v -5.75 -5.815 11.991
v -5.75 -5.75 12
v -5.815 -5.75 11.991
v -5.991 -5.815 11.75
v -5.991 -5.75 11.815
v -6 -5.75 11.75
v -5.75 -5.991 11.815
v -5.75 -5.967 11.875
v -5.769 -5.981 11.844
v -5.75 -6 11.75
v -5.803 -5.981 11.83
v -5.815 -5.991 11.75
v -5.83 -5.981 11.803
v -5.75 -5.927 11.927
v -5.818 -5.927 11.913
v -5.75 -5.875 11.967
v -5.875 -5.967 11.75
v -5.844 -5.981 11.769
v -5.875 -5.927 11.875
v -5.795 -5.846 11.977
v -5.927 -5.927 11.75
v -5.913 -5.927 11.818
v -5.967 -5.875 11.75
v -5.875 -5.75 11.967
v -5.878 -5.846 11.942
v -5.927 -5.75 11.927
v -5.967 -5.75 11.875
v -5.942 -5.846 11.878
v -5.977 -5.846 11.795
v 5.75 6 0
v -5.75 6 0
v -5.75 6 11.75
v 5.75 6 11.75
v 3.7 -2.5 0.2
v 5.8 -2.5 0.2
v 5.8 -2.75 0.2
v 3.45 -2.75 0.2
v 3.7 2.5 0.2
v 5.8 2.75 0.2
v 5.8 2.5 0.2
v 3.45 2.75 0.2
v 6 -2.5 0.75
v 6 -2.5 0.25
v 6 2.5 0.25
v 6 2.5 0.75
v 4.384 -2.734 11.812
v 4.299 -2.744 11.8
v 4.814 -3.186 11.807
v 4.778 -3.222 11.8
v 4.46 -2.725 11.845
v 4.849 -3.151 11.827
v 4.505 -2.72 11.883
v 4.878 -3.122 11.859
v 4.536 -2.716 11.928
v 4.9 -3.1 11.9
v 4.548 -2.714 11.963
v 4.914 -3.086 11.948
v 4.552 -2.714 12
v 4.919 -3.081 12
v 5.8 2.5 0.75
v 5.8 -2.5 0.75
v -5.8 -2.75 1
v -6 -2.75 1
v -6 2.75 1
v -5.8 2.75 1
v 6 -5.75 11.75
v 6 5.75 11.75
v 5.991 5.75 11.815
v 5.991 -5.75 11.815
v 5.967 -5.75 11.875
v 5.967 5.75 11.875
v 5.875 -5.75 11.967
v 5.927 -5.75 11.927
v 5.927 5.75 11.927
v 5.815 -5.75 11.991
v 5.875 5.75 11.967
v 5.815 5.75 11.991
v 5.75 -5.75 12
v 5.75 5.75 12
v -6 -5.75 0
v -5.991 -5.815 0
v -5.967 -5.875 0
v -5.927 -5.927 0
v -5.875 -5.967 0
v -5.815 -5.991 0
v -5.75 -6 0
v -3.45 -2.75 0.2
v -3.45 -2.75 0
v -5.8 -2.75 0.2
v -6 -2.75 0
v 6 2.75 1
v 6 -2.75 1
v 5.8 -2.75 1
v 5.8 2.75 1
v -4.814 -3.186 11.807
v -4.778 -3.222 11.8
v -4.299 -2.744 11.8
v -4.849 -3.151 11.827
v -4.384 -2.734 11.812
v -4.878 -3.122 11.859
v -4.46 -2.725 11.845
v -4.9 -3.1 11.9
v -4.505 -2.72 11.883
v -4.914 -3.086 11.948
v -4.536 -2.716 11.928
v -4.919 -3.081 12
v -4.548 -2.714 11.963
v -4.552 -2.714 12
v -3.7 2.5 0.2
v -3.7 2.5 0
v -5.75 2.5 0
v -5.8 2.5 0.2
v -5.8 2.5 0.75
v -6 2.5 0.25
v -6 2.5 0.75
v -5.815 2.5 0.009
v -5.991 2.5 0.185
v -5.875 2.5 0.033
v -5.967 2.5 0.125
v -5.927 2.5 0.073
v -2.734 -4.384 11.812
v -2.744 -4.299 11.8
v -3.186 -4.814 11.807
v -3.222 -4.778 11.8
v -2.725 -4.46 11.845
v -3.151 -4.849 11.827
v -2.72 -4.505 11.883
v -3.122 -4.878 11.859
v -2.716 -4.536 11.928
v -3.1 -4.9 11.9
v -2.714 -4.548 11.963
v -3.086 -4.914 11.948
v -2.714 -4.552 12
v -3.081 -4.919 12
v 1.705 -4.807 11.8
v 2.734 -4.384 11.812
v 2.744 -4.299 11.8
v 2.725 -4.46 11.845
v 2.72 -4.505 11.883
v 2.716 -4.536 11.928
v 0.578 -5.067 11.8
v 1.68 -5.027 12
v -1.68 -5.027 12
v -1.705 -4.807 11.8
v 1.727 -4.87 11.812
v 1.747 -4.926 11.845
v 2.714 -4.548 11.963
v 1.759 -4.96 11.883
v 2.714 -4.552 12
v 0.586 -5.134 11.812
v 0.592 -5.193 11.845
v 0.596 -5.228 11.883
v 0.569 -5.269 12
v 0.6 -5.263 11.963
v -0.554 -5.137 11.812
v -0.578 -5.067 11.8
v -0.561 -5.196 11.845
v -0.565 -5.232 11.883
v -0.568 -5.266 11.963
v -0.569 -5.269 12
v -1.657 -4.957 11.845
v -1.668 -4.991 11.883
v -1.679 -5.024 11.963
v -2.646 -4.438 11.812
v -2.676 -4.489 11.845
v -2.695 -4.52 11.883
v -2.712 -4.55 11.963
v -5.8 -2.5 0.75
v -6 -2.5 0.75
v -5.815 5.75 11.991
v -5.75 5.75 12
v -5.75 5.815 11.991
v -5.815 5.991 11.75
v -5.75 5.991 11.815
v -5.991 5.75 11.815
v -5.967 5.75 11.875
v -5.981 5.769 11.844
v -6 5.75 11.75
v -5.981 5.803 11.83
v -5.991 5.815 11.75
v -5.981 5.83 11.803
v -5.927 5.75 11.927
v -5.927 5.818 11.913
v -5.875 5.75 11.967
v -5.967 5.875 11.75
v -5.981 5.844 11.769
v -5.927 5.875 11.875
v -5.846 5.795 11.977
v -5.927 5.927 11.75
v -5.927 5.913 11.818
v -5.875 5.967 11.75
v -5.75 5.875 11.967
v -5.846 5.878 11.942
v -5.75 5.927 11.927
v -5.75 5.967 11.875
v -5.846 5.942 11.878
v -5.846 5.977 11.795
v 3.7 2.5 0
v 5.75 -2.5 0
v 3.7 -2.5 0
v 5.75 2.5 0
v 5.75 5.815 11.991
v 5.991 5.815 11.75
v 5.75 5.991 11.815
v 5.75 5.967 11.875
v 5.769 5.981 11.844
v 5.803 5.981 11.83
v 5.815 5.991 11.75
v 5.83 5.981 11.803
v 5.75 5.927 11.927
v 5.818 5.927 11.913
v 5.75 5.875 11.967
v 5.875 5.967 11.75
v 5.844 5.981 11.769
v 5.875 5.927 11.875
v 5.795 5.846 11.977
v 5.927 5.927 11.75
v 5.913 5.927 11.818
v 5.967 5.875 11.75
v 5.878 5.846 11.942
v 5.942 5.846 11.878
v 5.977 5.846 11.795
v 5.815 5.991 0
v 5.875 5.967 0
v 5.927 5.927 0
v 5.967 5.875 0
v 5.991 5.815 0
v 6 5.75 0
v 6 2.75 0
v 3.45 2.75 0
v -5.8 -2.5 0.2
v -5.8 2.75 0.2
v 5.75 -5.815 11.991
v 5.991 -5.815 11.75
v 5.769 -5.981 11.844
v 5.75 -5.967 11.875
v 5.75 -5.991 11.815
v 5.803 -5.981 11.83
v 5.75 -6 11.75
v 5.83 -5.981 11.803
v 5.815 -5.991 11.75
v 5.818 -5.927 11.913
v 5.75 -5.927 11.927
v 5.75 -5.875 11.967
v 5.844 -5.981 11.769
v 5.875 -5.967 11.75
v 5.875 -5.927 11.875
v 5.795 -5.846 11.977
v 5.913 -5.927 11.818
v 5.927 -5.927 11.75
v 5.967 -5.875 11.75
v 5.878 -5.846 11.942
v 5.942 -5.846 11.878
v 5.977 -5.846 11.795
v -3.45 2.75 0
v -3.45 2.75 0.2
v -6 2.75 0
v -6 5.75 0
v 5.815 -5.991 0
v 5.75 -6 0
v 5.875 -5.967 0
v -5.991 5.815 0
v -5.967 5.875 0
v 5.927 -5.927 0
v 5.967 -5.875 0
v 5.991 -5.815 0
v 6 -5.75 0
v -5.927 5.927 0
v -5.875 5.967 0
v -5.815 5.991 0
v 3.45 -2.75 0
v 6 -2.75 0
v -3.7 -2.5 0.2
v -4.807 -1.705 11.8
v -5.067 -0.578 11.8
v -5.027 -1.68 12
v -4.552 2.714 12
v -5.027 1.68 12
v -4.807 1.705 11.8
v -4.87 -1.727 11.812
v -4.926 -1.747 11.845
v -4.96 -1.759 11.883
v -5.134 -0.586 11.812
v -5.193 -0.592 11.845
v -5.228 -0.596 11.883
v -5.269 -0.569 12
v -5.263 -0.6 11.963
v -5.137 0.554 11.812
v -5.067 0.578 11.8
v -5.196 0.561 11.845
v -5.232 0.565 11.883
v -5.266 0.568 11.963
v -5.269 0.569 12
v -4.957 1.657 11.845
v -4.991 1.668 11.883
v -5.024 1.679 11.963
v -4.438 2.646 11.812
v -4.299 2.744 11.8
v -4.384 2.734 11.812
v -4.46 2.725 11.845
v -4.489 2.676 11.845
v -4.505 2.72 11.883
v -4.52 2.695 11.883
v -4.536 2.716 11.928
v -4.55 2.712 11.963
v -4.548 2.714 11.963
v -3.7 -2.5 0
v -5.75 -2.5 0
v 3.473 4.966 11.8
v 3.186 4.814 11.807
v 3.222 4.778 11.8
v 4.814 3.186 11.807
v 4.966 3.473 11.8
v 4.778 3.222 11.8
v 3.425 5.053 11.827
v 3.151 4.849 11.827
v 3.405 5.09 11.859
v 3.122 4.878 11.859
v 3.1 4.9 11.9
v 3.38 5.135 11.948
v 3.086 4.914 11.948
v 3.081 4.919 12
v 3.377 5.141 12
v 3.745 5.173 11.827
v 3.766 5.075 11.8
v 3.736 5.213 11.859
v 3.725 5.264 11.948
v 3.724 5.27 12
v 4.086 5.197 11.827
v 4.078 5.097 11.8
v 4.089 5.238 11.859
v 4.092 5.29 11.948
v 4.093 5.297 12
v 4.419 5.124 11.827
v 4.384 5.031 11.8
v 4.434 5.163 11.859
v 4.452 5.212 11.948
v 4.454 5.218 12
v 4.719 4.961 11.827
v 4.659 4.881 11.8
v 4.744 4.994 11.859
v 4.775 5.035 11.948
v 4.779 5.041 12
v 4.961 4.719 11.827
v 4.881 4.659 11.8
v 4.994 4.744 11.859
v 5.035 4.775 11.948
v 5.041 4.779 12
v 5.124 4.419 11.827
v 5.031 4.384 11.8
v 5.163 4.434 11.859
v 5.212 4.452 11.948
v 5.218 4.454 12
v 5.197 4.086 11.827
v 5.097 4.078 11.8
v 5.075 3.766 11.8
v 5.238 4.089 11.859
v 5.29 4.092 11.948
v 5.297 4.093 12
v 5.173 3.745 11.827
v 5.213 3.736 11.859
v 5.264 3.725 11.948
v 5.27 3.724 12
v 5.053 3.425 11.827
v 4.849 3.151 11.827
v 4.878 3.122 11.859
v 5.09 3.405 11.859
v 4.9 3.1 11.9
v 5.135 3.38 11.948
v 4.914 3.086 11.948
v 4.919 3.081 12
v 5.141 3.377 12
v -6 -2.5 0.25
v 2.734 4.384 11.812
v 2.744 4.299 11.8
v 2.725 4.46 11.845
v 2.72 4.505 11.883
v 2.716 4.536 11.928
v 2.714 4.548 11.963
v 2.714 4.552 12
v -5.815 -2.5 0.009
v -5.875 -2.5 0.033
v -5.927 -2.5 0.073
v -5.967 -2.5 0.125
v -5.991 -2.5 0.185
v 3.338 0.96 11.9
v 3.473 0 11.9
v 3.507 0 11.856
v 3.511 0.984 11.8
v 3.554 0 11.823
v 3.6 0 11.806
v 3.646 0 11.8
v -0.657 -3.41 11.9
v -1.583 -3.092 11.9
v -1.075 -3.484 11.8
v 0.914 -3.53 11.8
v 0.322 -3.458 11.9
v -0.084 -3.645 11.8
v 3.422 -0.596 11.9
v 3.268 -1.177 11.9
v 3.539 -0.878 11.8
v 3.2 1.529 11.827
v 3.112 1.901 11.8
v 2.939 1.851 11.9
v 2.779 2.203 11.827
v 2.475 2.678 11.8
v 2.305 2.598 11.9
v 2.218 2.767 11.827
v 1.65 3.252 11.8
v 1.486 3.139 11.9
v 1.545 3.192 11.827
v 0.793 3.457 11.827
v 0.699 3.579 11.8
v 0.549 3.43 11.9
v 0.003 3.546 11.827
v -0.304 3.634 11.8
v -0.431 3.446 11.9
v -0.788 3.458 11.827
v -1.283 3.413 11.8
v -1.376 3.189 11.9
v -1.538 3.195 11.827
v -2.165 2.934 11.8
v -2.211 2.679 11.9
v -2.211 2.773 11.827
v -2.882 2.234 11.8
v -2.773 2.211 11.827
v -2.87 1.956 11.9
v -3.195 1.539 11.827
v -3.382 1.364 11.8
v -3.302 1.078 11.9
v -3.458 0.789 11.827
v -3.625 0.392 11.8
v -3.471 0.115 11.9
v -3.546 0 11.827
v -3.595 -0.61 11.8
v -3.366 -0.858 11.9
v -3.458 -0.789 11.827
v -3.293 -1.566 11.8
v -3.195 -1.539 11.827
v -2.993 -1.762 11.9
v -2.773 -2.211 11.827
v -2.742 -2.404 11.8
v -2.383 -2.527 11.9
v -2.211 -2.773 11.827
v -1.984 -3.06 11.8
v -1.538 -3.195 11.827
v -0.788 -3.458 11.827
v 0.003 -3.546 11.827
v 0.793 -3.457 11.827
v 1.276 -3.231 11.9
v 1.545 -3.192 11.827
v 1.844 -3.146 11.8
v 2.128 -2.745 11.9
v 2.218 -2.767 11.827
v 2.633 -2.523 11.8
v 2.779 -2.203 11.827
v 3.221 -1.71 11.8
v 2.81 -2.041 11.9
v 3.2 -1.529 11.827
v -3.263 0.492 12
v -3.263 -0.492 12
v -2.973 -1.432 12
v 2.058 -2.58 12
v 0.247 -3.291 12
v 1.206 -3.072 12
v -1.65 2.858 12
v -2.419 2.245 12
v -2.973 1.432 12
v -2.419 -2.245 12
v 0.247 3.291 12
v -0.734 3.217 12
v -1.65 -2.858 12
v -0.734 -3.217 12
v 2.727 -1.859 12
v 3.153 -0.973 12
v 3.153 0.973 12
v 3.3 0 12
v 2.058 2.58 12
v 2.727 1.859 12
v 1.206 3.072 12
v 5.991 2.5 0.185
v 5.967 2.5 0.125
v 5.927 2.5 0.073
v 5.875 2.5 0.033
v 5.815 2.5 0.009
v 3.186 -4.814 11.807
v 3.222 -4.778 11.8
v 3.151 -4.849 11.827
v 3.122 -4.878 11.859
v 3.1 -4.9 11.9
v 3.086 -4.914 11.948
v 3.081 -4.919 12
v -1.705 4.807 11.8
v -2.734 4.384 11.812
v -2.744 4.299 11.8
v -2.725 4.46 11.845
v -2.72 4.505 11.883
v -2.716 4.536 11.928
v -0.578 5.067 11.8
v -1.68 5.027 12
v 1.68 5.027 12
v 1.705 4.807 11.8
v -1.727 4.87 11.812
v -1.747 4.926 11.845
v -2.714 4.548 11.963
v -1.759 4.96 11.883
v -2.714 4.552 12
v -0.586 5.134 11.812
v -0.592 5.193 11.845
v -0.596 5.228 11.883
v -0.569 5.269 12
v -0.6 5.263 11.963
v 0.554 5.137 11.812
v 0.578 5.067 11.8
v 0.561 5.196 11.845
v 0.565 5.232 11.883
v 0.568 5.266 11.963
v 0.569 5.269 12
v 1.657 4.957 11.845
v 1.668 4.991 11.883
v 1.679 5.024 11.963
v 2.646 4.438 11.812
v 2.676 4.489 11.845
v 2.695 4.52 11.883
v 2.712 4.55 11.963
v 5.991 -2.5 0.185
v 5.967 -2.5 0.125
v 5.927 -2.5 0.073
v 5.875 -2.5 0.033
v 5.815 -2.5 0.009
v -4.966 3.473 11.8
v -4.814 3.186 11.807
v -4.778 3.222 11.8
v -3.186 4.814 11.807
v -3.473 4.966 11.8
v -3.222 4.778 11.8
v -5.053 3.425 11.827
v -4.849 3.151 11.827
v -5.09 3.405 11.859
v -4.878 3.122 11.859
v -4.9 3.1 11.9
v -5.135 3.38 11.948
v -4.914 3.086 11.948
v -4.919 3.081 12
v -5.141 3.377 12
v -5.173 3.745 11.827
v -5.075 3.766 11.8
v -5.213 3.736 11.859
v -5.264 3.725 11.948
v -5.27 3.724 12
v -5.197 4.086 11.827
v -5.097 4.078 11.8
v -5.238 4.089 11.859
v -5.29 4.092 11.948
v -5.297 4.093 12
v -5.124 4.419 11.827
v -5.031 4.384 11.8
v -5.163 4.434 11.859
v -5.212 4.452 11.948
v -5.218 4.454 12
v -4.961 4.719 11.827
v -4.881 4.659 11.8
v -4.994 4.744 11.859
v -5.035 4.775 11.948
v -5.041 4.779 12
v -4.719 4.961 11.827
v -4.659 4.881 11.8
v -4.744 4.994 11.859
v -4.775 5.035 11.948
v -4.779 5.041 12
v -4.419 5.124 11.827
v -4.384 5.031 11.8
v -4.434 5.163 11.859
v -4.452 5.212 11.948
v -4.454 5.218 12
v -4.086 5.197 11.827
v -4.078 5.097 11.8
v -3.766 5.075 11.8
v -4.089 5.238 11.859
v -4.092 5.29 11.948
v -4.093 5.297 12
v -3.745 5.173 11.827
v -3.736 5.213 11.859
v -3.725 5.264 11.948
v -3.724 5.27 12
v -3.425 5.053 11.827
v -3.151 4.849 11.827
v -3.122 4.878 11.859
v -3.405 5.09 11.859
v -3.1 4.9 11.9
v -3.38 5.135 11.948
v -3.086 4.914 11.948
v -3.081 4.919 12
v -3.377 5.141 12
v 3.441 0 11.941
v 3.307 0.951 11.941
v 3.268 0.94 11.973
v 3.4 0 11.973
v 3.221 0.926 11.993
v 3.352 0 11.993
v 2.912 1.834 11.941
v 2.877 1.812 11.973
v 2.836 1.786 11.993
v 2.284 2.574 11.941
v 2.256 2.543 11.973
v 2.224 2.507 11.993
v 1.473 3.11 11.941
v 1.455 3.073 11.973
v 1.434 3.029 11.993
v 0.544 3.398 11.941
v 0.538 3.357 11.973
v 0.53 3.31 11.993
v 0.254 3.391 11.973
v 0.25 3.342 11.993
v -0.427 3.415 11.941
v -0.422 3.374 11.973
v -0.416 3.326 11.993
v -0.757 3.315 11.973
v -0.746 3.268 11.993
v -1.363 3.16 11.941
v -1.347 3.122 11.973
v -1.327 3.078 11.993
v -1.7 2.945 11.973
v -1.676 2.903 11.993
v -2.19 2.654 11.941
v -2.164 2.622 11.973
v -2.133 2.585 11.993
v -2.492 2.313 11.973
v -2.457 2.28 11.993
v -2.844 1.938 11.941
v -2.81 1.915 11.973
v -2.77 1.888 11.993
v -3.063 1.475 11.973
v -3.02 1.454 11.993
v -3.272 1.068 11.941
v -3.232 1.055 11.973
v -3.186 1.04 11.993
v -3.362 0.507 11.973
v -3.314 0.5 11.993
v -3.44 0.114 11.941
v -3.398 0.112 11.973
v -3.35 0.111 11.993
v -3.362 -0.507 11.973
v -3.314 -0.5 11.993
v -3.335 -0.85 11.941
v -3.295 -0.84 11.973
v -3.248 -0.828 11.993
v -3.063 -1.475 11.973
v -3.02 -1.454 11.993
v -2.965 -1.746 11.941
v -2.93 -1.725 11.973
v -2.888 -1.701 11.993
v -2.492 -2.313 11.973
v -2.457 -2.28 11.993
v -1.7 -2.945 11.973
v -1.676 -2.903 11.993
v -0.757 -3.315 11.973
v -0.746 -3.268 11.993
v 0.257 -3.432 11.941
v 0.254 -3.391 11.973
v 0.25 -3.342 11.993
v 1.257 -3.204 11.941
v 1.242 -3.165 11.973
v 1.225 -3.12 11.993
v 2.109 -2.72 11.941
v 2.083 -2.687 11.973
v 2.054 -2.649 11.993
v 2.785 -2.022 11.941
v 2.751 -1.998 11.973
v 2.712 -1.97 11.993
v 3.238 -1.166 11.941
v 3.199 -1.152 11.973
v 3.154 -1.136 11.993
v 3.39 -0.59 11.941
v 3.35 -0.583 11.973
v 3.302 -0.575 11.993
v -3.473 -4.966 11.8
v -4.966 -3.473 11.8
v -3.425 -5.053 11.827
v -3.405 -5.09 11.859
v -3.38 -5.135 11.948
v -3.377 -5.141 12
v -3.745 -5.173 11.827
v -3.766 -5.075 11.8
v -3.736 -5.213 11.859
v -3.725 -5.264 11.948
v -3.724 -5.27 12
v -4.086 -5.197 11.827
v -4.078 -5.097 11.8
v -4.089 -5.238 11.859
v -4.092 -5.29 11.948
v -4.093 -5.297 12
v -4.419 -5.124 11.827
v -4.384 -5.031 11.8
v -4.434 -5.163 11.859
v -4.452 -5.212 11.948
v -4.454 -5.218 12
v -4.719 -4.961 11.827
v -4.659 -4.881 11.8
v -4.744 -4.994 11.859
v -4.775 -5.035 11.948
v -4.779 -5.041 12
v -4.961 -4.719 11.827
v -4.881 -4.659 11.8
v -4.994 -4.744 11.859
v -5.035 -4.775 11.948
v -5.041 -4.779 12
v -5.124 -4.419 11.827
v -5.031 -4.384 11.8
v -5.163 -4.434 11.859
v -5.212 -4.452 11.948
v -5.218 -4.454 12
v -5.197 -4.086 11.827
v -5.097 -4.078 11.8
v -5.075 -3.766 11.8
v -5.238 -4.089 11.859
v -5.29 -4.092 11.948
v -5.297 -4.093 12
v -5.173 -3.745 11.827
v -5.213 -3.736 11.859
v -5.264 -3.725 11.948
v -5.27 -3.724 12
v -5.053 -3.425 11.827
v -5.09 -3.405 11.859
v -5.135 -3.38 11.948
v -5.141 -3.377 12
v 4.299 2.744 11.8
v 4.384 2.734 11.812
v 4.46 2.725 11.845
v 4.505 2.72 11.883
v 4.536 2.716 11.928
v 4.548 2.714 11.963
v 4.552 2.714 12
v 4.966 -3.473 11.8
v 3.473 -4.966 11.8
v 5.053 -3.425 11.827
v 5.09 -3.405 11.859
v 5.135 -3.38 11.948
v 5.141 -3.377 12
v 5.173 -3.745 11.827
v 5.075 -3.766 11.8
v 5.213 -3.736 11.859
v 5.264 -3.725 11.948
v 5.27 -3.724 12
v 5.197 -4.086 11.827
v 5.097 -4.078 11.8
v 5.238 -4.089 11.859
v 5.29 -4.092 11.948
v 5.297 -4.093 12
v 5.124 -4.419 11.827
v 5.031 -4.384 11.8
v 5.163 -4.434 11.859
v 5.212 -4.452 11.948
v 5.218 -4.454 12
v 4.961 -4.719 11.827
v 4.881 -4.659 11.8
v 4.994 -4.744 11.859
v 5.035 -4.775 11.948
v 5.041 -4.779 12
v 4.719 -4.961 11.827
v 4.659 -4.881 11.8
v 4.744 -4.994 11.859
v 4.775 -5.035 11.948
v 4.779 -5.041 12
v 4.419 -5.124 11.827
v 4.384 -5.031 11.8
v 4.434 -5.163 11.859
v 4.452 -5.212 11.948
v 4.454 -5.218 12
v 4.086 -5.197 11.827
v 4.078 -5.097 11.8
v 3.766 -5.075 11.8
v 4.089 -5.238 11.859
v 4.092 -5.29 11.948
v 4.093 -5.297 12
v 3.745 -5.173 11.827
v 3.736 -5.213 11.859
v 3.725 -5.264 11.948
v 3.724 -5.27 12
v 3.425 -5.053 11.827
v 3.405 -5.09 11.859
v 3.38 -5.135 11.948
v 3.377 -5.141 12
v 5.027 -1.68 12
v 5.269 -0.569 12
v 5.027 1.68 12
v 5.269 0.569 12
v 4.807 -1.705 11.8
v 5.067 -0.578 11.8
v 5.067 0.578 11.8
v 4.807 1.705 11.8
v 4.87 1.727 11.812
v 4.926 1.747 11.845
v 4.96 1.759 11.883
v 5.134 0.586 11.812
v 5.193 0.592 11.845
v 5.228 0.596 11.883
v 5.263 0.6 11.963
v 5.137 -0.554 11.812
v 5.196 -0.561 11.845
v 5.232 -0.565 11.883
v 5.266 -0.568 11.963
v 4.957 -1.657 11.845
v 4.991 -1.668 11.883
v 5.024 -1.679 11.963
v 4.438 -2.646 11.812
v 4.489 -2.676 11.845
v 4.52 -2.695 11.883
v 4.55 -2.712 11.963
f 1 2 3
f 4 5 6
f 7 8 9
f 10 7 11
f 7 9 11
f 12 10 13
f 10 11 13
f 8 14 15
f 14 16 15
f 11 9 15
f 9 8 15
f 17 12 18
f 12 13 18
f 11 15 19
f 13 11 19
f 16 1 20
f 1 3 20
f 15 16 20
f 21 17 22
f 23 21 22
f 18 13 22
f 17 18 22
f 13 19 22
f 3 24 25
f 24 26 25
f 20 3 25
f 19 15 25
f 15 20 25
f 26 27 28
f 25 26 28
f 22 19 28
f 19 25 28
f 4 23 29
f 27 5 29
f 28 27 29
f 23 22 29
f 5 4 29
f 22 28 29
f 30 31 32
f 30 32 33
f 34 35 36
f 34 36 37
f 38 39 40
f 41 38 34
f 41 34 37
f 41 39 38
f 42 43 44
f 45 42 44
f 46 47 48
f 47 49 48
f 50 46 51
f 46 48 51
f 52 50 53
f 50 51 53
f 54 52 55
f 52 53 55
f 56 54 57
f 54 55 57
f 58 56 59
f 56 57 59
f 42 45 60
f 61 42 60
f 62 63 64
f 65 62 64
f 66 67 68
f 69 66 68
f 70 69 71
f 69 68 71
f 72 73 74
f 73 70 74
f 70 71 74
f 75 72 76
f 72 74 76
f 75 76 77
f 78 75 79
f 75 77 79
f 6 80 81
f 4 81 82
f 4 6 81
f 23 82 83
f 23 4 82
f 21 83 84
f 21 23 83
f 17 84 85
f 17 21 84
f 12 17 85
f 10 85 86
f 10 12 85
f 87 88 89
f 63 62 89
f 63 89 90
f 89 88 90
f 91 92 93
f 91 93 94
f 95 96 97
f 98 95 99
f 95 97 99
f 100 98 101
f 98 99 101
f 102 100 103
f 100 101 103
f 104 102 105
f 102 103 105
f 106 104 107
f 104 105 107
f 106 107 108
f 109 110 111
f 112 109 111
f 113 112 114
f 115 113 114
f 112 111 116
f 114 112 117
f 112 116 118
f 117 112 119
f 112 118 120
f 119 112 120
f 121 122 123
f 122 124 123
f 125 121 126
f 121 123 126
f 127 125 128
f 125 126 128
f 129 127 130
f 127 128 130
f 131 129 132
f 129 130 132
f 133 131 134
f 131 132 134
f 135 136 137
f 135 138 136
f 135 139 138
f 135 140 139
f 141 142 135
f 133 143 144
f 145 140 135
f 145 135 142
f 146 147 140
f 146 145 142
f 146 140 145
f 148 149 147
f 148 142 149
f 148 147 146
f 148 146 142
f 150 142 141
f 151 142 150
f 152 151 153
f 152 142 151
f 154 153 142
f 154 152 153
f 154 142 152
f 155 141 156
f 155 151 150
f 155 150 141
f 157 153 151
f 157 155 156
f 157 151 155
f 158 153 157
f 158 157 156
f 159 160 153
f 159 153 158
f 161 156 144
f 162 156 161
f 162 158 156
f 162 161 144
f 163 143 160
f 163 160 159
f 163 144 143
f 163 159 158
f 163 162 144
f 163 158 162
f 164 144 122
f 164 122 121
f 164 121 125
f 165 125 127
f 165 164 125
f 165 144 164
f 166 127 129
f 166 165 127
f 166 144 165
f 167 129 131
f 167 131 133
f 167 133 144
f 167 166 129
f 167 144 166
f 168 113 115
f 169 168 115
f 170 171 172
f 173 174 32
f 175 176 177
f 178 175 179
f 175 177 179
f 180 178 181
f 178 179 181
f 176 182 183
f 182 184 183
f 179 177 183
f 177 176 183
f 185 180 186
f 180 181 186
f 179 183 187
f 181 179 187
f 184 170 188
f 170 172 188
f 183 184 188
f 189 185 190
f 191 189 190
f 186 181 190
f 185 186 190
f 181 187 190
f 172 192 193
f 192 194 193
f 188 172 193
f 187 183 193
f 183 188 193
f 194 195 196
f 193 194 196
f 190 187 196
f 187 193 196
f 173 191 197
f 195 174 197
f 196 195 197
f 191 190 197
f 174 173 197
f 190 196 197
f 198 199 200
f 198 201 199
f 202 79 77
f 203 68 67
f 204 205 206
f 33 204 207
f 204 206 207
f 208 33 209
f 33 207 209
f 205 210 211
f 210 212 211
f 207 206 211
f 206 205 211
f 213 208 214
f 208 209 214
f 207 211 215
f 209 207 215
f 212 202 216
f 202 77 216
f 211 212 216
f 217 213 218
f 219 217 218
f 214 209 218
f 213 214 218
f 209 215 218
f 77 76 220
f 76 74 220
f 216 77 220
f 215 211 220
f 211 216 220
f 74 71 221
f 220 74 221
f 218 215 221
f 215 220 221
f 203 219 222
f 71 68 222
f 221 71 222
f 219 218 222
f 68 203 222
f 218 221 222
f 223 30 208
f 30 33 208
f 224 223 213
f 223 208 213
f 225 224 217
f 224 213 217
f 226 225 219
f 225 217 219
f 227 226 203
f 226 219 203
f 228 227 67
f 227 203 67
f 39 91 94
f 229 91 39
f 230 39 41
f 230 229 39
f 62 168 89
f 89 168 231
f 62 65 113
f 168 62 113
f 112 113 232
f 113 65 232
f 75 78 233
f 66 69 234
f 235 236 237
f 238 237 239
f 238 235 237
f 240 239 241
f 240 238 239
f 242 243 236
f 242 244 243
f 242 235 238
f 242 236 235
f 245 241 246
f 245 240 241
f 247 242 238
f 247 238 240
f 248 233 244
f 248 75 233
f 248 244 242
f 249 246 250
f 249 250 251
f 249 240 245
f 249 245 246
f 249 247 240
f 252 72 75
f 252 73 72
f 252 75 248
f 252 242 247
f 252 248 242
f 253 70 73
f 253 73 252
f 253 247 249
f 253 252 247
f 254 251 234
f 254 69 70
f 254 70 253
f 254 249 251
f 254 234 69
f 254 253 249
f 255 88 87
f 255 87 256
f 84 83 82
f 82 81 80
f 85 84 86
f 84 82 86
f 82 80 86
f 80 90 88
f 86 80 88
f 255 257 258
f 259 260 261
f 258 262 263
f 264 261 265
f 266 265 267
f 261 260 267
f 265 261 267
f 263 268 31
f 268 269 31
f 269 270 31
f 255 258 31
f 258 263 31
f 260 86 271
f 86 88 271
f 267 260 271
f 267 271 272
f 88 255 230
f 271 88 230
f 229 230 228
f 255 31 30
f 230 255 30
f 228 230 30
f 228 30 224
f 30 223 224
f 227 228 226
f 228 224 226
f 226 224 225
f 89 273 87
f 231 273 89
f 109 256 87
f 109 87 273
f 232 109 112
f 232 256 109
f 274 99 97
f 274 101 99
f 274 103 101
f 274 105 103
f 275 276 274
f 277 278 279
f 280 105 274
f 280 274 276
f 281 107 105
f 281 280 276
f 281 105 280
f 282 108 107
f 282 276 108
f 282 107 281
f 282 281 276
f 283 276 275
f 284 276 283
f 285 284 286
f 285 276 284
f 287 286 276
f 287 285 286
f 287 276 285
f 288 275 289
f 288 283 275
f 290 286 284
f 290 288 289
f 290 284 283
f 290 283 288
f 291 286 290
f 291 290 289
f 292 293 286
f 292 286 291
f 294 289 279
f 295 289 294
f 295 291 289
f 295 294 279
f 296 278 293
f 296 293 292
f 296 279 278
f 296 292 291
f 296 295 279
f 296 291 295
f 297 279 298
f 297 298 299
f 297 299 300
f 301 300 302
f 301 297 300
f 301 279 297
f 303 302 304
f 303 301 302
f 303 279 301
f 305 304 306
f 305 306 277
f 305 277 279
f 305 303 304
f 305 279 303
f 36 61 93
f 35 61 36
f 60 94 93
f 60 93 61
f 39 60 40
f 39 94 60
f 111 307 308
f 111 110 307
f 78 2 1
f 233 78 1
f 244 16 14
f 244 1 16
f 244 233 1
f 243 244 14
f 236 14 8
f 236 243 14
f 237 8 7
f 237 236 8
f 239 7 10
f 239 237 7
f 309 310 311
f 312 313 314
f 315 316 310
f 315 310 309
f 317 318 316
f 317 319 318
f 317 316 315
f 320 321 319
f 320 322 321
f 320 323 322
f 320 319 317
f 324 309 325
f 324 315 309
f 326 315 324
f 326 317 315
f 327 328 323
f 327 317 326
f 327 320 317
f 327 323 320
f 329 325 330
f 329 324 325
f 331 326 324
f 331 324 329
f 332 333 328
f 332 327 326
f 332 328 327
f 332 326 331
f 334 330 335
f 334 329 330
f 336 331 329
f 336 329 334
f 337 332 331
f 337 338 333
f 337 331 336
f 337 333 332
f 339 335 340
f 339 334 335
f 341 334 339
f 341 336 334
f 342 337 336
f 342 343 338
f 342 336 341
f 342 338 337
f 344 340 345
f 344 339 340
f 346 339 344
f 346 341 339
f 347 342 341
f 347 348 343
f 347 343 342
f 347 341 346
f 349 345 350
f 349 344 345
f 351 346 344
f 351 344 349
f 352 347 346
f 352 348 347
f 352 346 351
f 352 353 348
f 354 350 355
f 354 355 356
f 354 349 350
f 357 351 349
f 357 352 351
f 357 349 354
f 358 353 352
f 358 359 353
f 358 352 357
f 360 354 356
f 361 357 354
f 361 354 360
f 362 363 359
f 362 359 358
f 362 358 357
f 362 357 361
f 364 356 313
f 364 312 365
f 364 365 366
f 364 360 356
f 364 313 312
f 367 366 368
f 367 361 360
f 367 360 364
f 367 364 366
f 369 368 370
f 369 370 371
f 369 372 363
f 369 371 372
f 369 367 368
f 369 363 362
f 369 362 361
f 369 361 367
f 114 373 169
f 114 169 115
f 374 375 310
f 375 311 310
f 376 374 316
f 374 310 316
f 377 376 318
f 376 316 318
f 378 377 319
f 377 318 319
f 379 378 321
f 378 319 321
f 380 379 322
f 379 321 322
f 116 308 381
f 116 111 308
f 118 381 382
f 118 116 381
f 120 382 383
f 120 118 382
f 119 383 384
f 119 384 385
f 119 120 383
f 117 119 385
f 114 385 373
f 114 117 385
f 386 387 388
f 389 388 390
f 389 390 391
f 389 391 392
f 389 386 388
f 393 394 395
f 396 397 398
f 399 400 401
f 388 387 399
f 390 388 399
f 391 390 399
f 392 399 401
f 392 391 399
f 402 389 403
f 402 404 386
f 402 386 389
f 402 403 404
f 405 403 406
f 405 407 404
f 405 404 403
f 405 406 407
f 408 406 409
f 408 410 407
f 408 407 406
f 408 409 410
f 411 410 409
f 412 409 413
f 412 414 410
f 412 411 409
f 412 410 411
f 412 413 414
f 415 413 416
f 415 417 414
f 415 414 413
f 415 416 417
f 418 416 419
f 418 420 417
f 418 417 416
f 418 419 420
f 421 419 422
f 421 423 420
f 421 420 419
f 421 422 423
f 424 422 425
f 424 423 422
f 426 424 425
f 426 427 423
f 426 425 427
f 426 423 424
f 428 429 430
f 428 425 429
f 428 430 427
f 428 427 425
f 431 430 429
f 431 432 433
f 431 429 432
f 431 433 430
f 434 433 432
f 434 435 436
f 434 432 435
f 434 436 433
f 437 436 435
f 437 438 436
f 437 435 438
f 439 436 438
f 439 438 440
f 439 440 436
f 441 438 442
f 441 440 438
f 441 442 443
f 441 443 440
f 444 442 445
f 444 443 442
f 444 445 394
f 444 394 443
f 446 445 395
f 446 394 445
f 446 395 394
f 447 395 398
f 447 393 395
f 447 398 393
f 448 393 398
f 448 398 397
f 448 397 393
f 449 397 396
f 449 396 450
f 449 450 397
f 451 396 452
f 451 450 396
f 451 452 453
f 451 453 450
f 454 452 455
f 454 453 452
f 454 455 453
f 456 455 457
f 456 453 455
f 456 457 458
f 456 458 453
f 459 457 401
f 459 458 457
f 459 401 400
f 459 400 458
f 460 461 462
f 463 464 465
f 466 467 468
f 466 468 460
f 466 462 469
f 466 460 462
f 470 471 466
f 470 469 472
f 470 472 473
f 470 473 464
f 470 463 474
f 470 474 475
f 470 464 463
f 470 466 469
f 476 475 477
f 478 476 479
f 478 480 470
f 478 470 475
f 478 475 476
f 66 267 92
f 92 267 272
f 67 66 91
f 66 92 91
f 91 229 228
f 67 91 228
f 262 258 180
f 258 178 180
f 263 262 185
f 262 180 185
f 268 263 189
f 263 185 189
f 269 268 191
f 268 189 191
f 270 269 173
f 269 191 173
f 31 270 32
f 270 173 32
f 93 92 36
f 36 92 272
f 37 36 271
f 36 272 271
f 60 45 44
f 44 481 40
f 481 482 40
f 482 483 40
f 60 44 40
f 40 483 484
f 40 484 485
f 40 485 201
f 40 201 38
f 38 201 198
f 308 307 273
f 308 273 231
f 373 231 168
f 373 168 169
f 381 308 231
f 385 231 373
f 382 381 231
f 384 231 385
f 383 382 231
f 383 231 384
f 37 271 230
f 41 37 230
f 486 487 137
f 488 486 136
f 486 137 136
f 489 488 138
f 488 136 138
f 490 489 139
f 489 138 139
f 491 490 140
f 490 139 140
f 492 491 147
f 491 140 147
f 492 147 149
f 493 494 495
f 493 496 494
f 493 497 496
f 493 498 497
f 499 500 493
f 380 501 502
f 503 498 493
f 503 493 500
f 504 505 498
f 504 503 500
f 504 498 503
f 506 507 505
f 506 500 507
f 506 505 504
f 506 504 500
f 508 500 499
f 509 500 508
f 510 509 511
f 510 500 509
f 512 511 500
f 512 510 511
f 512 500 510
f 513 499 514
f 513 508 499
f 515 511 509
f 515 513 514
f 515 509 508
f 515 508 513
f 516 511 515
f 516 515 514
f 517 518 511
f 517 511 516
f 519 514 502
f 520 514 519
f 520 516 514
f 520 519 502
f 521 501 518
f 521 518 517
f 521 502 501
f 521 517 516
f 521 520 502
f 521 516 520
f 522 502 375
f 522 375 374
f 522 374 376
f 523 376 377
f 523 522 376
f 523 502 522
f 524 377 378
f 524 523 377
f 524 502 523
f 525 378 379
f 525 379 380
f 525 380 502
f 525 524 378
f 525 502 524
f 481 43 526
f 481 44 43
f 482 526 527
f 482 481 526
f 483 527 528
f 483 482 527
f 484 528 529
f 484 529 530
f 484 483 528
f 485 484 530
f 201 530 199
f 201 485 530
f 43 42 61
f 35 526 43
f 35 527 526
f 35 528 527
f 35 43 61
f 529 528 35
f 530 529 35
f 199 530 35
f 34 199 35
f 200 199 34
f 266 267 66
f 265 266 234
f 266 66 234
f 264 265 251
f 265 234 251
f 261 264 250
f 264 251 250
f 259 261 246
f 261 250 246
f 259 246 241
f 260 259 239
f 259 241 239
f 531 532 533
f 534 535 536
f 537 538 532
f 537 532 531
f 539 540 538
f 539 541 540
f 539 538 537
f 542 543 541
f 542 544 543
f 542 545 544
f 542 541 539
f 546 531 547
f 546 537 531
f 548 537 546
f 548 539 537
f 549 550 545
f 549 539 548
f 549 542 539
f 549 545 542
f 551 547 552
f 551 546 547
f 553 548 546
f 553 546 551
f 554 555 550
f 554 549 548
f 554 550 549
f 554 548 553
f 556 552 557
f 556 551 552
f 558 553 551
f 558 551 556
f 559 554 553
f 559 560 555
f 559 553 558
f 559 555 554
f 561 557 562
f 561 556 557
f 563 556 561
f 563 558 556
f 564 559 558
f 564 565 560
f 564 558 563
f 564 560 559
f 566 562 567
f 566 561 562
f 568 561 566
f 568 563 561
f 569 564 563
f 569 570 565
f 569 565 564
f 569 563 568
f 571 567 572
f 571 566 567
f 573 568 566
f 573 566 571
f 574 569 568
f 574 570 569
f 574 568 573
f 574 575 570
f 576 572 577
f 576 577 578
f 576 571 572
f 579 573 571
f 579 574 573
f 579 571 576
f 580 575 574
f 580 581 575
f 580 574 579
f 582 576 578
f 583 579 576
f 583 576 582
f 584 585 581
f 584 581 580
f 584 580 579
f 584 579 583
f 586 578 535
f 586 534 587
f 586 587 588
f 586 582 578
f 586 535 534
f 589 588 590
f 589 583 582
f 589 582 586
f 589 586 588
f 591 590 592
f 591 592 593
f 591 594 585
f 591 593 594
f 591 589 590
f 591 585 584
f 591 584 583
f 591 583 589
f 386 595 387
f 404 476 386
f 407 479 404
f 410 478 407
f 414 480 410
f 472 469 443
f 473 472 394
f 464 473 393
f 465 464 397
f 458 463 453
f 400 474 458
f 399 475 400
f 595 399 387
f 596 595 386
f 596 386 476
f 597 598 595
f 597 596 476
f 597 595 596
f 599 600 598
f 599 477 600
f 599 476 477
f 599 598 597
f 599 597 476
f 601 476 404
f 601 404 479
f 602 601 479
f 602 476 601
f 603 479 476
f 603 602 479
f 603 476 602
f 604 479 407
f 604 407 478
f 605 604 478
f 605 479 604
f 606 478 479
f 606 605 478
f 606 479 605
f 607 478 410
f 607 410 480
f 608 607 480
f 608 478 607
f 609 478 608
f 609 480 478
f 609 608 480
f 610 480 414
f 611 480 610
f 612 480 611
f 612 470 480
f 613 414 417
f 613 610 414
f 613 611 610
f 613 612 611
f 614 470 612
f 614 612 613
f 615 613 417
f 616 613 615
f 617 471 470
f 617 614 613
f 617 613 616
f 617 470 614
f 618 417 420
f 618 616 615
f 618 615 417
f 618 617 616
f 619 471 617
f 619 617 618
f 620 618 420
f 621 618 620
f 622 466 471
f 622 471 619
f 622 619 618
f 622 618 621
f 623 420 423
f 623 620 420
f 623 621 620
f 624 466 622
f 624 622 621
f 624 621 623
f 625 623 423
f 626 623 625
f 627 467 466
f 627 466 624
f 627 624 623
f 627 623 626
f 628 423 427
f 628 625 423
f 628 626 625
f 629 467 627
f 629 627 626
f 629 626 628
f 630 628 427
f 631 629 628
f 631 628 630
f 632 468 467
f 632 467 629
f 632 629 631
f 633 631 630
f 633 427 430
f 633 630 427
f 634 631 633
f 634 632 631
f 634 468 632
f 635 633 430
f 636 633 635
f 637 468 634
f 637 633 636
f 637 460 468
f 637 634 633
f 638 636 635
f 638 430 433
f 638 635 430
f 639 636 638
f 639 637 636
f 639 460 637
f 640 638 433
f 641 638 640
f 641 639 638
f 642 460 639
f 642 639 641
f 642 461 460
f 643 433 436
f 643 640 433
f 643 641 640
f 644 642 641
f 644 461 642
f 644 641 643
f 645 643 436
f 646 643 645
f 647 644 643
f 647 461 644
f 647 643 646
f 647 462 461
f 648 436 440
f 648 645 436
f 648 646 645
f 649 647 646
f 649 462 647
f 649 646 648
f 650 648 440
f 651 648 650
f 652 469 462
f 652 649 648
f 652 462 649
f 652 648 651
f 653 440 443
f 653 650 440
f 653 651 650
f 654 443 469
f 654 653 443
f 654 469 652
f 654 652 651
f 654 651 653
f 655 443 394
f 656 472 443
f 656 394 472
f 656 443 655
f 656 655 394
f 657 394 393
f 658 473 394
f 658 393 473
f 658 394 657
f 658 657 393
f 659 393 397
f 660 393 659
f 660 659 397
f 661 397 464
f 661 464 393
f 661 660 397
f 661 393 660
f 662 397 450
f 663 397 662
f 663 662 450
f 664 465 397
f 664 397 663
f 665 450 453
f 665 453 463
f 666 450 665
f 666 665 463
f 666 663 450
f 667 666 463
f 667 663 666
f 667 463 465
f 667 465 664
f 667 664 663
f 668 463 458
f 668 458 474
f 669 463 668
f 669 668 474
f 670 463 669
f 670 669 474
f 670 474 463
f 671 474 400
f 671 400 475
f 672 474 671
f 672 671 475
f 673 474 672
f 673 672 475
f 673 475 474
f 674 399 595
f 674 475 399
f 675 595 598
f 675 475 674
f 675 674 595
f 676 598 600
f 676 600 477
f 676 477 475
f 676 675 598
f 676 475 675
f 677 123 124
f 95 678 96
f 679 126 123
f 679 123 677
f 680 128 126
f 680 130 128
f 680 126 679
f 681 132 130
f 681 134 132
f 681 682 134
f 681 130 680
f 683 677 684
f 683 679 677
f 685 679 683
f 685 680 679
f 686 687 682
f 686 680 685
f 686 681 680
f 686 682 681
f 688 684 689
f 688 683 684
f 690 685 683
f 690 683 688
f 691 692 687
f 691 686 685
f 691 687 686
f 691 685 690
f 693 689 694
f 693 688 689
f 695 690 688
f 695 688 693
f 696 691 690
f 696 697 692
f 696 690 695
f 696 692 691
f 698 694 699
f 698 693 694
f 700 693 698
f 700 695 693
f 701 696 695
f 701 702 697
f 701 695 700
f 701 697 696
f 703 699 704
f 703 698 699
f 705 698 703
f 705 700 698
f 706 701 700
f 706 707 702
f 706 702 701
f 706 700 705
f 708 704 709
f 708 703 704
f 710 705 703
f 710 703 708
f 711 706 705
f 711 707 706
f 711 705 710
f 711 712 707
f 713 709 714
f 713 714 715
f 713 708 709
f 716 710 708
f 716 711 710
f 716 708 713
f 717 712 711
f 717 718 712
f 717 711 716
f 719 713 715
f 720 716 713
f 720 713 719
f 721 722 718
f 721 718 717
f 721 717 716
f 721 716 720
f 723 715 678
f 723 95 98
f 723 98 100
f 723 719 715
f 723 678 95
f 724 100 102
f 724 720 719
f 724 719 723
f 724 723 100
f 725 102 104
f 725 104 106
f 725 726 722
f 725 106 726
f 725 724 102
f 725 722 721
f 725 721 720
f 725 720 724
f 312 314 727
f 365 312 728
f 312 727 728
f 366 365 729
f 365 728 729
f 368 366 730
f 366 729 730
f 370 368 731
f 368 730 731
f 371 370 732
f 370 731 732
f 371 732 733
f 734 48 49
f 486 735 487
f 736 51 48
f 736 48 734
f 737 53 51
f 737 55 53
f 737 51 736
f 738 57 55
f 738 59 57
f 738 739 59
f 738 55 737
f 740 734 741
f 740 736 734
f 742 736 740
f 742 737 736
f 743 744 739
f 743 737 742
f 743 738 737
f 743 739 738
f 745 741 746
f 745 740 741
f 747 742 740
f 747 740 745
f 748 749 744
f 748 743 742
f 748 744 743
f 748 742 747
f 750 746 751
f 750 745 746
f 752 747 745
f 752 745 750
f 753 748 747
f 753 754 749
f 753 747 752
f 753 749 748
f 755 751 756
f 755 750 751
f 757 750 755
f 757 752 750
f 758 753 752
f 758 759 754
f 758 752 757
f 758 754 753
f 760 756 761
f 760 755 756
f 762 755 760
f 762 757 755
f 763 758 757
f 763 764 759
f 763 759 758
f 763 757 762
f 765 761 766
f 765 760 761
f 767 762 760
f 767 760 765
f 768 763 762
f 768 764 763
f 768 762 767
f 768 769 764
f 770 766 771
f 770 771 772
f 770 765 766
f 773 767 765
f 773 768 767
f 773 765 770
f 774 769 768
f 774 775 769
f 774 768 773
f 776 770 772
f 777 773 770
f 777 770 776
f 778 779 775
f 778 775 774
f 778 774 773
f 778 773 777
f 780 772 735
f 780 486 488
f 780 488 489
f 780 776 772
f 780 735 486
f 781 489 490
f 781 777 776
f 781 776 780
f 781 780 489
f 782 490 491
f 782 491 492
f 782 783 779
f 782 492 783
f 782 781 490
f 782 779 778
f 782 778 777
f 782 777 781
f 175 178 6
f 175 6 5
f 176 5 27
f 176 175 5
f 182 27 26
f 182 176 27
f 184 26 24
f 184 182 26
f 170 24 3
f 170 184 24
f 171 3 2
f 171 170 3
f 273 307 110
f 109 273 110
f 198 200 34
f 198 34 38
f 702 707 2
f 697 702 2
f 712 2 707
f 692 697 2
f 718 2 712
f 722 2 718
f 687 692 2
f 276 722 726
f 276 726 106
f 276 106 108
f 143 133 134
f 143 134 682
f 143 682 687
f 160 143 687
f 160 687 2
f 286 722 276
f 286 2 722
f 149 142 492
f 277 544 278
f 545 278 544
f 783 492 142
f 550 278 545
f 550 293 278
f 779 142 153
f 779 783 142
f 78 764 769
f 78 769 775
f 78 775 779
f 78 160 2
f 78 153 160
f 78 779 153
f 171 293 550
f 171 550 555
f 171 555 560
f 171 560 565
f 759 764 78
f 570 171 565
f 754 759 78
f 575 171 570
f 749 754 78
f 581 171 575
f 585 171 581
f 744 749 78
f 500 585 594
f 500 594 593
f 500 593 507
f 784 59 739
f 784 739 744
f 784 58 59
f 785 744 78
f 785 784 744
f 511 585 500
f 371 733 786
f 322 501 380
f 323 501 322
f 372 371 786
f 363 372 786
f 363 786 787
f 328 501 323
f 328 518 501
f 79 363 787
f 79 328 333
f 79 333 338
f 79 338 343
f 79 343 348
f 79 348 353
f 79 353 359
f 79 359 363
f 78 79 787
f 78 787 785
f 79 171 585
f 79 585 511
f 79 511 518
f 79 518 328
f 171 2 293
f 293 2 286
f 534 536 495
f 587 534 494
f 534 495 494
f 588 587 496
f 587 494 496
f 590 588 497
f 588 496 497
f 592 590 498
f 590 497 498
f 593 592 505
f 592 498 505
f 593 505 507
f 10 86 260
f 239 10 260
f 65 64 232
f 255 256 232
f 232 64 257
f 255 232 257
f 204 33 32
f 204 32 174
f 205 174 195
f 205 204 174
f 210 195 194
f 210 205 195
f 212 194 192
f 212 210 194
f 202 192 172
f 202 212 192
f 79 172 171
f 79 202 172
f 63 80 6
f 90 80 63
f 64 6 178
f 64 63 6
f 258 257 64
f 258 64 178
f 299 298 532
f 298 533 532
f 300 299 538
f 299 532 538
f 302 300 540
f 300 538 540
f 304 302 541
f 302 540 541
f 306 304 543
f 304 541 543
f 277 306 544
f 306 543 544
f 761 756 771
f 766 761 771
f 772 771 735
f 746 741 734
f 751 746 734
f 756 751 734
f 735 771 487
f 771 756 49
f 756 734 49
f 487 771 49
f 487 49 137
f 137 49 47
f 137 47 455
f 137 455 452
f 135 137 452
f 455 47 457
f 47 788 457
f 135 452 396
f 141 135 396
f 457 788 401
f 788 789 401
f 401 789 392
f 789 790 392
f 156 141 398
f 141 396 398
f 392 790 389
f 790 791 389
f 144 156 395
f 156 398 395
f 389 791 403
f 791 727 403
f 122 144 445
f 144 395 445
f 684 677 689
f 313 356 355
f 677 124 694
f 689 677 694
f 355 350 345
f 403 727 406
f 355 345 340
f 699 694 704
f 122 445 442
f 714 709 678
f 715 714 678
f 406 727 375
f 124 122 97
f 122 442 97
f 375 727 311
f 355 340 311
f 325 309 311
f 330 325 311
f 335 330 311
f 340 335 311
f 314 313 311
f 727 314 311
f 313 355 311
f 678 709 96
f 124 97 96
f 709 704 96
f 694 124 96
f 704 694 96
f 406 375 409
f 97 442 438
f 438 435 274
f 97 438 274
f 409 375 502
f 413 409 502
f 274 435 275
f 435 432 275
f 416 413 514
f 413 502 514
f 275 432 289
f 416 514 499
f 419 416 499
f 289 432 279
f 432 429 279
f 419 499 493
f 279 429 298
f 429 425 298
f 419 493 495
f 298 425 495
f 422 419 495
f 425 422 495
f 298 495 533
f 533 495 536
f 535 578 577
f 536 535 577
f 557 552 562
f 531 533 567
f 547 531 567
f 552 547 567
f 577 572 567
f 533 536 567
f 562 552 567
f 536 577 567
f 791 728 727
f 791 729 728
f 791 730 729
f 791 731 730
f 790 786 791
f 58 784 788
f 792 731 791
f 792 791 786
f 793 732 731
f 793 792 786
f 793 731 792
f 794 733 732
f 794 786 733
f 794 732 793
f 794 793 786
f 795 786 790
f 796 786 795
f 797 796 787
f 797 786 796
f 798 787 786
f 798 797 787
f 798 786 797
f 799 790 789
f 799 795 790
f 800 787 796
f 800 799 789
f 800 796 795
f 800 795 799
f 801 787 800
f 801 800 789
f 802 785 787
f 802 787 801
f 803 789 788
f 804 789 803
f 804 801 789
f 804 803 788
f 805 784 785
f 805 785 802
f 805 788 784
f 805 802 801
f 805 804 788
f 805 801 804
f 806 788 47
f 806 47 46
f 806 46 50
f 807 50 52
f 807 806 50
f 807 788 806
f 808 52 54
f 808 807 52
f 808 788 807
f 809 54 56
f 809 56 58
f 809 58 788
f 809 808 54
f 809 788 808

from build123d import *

# Parameters (mm, degrees)
SKETCH2_W           = 12
SKETCH2_H           = 12
BOSS_EXTRUDE1_DEPTH = 12
SKETCH3_W           = 2.55
SKETCH3_H           = 5.5
CUT_EXTRUDE1_DEPTH  = 0.2
SKETCH4_W           = 0.8
SKETCH4_H           = 5.5
CUT_EXTRUDE2_DEPTH  = 0.2
FILLET1_R           = 0.25
SKETCH5_W           = 2.3
SKETCH5_H           = 5
BOSS_EXTRUDE2_DEPTH = 0.75
FILLET2_R           = 0.25
SKETCH6_R           = 3.5
CUT_EXTRUDE3_DEPTH  = 0.2
FILLET3_R           = 0.2
FILLET4_R           = 0.2


with BuildPart() as part:
    # Sketch2 → Boss-Extrude1 (new body)
    with BuildSketch(Plane.XY):
        Rectangle(SKETCH2_W, SKETCH2_H)
    extrude(amount=BOSS_EXTRUDE1_DEPTH)

    # Sketch3 → Cut-Extrude1 (cut)
    with BuildSketch(Plane(origin=(0, 0, 0), x_dir=(-1, 0, 0), z_dir=(0, 0, -1))):
        with Locations((-4.725, 0)):
            Rectangle(SKETCH3_W, SKETCH3_H)
        with Locations((4.725, 0)):
            Rectangle(SKETCH3_W, SKETCH3_H)
    extrude(amount=-CUT_EXTRUDE1_DEPTH, mode=Mode.SUBTRACT)

    # Sketch4 → Cut-Extrude2 (cut)
    with BuildSketch(Plane(origin=(6, 0, 0), x_dir=(0, 0, -1), z_dir=(1, 0, 0))):
        with Locations((-0.6, 0)):
            Rectangle(SKETCH4_W, SKETCH4_H)
    cut_extrude2 = extrude(amount=-CUT_EXTRUDE2_DEPTH, mode=Mode.SUBTRACT)

    # Mirror1: Cut-Extrude2 across plane
    add(cut_extrude2.mirror(Plane(origin=(0, 0, 0), x_dir=(0, 0, 1), z_dir=(1, 0, 0))), mode=Mode.SUBTRACT)

    # Fillet1
    fillet1_edges = [part.edges().sort_by_distance(p)[0] for p in [
        (6, 0, 12),
        (0, 6, 12),
        (-6, 0, 12),
        (0, -6, 12),
        (-6, 6, 6),
        (6, 6, 6),
        (6, -6, 6),
        (-6, -6, 6),
    ]]
    fillet(fillet1_edges, radius=FILLET1_R)

    # Sketch5 → Boss-Extrude2 (add)
    with BuildSketch(Plane(origin=(0, 0, 0), x_dir=(-1, 0, 0), z_dir=(0, 0, -1))):
        with Locations((-4.85, 0)):
            Rectangle(SKETCH5_W, SKETCH5_H)
        with Locations((4.85, 0)):
            Rectangle(SKETCH5_W, SKETCH5_H)
    extrude(amount=-BOSS_EXTRUDE2_DEPTH)

    # Fillet2
    fillet2_edges = [part.edges().sort_by_distance(p)[0] for p in [
        (6, 0, 0),
        (-6, 0, 0),
    ]]
    fillet(fillet2_edges, radius=FILLET2_R)

    # Sketch6 → Cut-Extrude3 (cut)
    with BuildSketch(Plane.XY.offset(12)):
        with BuildLine():
            Line((3.080761184, -4.919238816), (2.713941609, -4.55241924))
            ThreePointArc((2.713941609, -4.55241924), (0, -5.3), (-2.713941609, -4.55241924))
            Line((-2.713941609, -4.55241924), (-3.080761184, -4.919238816))
            ThreePointArc((-3.080761184, -4.919238816), (-4.919238816, -4.919238816), (-4.919238816, -3.080761184))
            Line((-4.919238816, -3.080761184), (-4.55241924, -2.713941609))
            ThreePointArc((-4.55241924, -2.713941609), (-5.3, 0), (-4.55241924, 2.713941609))
            Line((-4.55241924, 2.713941609), (-4.919238816, 3.080761184))
            ThreePointArc((-4.919238816, 3.080761184), (-4.919238816, 4.919238816), (-3.080761184, 4.919238816))
            Line((-3.080761184, 4.919238816), (-2.713941609, 4.55241924))
            ThreePointArc((-2.713941609, 4.55241924), (0, 5.3), (2.713941609, 4.55241924))
            Line((2.713941609, 4.55241924), (3.080761184, 4.919238816))
            ThreePointArc((3.080761184, 4.919238816), (4.919238816, 4.919238816), (4.919238816, 3.080761184))
            Line((4.919238816, 3.080761184), (4.55241924, 2.713941609))
            ThreePointArc((4.55241924, 2.713941609), (5.3, 0), (4.55241924, -2.713941609))
            Line((4.55241924, -2.713941609), (4.919238816, -3.080761184))
            ThreePointArc((4.919238816, -3.080761184), (4.919238816, -4.919238816), (3.080761184, -4.919238816))
        make_face()
        Circle(SKETCH6_R, mode=Mode.SUBTRACT)
    extrude(amount=-CUT_EXTRUDE3_DEPTH, mode=Mode.SUBTRACT)

    # Fillet3
    fillet3_edges = [part.edges().sort_by_distance(p)[0] for p in [
        (-3.5, 0, 12),
    ]]
    fillet(fillet3_edges, radius=FILLET3_R - 0.0001)  # a hair under: the kernel refuses the full size

    # Fillet4
    fillet4_edges = [part.edges().sort_by_distance(p)[0] for p in [
        (2.897351397, -4.735829028, 11.8),
        (0, -5.3, 11.8),
        (-2.897351397, -4.735829028, 11.8),
        (-4.919238816, -4.919238816, 11.8),
        (-4.735829028, -2.897351397, 11.8),
        (-5.3, 0, 11.8),
        (-4.735829028, 2.897351397, 11.8),
        (-4.919238816, 4.919238816, 11.8),
        (-2.897351397, 4.735829028, 11.8),
        (0, 5.3, 11.8),
        (2.897351397, 4.735829028, 11.8),
        (4.919238816, 4.919238816, 11.8),
        (4.735829028, 2.897351397, 11.8),
        (5.3, 0, 11.8),
        (4.735829028, -2.897351397, 11.8),
        (4.919238816, -4.919238816, 11.8),
        (-3.5, 0, 11.8),
    ]]
    fillet(fillet4_edges, radius=FILLET4_R - 0.0001)  # a hair under: the kernel refuses the full size


solid = part.part
